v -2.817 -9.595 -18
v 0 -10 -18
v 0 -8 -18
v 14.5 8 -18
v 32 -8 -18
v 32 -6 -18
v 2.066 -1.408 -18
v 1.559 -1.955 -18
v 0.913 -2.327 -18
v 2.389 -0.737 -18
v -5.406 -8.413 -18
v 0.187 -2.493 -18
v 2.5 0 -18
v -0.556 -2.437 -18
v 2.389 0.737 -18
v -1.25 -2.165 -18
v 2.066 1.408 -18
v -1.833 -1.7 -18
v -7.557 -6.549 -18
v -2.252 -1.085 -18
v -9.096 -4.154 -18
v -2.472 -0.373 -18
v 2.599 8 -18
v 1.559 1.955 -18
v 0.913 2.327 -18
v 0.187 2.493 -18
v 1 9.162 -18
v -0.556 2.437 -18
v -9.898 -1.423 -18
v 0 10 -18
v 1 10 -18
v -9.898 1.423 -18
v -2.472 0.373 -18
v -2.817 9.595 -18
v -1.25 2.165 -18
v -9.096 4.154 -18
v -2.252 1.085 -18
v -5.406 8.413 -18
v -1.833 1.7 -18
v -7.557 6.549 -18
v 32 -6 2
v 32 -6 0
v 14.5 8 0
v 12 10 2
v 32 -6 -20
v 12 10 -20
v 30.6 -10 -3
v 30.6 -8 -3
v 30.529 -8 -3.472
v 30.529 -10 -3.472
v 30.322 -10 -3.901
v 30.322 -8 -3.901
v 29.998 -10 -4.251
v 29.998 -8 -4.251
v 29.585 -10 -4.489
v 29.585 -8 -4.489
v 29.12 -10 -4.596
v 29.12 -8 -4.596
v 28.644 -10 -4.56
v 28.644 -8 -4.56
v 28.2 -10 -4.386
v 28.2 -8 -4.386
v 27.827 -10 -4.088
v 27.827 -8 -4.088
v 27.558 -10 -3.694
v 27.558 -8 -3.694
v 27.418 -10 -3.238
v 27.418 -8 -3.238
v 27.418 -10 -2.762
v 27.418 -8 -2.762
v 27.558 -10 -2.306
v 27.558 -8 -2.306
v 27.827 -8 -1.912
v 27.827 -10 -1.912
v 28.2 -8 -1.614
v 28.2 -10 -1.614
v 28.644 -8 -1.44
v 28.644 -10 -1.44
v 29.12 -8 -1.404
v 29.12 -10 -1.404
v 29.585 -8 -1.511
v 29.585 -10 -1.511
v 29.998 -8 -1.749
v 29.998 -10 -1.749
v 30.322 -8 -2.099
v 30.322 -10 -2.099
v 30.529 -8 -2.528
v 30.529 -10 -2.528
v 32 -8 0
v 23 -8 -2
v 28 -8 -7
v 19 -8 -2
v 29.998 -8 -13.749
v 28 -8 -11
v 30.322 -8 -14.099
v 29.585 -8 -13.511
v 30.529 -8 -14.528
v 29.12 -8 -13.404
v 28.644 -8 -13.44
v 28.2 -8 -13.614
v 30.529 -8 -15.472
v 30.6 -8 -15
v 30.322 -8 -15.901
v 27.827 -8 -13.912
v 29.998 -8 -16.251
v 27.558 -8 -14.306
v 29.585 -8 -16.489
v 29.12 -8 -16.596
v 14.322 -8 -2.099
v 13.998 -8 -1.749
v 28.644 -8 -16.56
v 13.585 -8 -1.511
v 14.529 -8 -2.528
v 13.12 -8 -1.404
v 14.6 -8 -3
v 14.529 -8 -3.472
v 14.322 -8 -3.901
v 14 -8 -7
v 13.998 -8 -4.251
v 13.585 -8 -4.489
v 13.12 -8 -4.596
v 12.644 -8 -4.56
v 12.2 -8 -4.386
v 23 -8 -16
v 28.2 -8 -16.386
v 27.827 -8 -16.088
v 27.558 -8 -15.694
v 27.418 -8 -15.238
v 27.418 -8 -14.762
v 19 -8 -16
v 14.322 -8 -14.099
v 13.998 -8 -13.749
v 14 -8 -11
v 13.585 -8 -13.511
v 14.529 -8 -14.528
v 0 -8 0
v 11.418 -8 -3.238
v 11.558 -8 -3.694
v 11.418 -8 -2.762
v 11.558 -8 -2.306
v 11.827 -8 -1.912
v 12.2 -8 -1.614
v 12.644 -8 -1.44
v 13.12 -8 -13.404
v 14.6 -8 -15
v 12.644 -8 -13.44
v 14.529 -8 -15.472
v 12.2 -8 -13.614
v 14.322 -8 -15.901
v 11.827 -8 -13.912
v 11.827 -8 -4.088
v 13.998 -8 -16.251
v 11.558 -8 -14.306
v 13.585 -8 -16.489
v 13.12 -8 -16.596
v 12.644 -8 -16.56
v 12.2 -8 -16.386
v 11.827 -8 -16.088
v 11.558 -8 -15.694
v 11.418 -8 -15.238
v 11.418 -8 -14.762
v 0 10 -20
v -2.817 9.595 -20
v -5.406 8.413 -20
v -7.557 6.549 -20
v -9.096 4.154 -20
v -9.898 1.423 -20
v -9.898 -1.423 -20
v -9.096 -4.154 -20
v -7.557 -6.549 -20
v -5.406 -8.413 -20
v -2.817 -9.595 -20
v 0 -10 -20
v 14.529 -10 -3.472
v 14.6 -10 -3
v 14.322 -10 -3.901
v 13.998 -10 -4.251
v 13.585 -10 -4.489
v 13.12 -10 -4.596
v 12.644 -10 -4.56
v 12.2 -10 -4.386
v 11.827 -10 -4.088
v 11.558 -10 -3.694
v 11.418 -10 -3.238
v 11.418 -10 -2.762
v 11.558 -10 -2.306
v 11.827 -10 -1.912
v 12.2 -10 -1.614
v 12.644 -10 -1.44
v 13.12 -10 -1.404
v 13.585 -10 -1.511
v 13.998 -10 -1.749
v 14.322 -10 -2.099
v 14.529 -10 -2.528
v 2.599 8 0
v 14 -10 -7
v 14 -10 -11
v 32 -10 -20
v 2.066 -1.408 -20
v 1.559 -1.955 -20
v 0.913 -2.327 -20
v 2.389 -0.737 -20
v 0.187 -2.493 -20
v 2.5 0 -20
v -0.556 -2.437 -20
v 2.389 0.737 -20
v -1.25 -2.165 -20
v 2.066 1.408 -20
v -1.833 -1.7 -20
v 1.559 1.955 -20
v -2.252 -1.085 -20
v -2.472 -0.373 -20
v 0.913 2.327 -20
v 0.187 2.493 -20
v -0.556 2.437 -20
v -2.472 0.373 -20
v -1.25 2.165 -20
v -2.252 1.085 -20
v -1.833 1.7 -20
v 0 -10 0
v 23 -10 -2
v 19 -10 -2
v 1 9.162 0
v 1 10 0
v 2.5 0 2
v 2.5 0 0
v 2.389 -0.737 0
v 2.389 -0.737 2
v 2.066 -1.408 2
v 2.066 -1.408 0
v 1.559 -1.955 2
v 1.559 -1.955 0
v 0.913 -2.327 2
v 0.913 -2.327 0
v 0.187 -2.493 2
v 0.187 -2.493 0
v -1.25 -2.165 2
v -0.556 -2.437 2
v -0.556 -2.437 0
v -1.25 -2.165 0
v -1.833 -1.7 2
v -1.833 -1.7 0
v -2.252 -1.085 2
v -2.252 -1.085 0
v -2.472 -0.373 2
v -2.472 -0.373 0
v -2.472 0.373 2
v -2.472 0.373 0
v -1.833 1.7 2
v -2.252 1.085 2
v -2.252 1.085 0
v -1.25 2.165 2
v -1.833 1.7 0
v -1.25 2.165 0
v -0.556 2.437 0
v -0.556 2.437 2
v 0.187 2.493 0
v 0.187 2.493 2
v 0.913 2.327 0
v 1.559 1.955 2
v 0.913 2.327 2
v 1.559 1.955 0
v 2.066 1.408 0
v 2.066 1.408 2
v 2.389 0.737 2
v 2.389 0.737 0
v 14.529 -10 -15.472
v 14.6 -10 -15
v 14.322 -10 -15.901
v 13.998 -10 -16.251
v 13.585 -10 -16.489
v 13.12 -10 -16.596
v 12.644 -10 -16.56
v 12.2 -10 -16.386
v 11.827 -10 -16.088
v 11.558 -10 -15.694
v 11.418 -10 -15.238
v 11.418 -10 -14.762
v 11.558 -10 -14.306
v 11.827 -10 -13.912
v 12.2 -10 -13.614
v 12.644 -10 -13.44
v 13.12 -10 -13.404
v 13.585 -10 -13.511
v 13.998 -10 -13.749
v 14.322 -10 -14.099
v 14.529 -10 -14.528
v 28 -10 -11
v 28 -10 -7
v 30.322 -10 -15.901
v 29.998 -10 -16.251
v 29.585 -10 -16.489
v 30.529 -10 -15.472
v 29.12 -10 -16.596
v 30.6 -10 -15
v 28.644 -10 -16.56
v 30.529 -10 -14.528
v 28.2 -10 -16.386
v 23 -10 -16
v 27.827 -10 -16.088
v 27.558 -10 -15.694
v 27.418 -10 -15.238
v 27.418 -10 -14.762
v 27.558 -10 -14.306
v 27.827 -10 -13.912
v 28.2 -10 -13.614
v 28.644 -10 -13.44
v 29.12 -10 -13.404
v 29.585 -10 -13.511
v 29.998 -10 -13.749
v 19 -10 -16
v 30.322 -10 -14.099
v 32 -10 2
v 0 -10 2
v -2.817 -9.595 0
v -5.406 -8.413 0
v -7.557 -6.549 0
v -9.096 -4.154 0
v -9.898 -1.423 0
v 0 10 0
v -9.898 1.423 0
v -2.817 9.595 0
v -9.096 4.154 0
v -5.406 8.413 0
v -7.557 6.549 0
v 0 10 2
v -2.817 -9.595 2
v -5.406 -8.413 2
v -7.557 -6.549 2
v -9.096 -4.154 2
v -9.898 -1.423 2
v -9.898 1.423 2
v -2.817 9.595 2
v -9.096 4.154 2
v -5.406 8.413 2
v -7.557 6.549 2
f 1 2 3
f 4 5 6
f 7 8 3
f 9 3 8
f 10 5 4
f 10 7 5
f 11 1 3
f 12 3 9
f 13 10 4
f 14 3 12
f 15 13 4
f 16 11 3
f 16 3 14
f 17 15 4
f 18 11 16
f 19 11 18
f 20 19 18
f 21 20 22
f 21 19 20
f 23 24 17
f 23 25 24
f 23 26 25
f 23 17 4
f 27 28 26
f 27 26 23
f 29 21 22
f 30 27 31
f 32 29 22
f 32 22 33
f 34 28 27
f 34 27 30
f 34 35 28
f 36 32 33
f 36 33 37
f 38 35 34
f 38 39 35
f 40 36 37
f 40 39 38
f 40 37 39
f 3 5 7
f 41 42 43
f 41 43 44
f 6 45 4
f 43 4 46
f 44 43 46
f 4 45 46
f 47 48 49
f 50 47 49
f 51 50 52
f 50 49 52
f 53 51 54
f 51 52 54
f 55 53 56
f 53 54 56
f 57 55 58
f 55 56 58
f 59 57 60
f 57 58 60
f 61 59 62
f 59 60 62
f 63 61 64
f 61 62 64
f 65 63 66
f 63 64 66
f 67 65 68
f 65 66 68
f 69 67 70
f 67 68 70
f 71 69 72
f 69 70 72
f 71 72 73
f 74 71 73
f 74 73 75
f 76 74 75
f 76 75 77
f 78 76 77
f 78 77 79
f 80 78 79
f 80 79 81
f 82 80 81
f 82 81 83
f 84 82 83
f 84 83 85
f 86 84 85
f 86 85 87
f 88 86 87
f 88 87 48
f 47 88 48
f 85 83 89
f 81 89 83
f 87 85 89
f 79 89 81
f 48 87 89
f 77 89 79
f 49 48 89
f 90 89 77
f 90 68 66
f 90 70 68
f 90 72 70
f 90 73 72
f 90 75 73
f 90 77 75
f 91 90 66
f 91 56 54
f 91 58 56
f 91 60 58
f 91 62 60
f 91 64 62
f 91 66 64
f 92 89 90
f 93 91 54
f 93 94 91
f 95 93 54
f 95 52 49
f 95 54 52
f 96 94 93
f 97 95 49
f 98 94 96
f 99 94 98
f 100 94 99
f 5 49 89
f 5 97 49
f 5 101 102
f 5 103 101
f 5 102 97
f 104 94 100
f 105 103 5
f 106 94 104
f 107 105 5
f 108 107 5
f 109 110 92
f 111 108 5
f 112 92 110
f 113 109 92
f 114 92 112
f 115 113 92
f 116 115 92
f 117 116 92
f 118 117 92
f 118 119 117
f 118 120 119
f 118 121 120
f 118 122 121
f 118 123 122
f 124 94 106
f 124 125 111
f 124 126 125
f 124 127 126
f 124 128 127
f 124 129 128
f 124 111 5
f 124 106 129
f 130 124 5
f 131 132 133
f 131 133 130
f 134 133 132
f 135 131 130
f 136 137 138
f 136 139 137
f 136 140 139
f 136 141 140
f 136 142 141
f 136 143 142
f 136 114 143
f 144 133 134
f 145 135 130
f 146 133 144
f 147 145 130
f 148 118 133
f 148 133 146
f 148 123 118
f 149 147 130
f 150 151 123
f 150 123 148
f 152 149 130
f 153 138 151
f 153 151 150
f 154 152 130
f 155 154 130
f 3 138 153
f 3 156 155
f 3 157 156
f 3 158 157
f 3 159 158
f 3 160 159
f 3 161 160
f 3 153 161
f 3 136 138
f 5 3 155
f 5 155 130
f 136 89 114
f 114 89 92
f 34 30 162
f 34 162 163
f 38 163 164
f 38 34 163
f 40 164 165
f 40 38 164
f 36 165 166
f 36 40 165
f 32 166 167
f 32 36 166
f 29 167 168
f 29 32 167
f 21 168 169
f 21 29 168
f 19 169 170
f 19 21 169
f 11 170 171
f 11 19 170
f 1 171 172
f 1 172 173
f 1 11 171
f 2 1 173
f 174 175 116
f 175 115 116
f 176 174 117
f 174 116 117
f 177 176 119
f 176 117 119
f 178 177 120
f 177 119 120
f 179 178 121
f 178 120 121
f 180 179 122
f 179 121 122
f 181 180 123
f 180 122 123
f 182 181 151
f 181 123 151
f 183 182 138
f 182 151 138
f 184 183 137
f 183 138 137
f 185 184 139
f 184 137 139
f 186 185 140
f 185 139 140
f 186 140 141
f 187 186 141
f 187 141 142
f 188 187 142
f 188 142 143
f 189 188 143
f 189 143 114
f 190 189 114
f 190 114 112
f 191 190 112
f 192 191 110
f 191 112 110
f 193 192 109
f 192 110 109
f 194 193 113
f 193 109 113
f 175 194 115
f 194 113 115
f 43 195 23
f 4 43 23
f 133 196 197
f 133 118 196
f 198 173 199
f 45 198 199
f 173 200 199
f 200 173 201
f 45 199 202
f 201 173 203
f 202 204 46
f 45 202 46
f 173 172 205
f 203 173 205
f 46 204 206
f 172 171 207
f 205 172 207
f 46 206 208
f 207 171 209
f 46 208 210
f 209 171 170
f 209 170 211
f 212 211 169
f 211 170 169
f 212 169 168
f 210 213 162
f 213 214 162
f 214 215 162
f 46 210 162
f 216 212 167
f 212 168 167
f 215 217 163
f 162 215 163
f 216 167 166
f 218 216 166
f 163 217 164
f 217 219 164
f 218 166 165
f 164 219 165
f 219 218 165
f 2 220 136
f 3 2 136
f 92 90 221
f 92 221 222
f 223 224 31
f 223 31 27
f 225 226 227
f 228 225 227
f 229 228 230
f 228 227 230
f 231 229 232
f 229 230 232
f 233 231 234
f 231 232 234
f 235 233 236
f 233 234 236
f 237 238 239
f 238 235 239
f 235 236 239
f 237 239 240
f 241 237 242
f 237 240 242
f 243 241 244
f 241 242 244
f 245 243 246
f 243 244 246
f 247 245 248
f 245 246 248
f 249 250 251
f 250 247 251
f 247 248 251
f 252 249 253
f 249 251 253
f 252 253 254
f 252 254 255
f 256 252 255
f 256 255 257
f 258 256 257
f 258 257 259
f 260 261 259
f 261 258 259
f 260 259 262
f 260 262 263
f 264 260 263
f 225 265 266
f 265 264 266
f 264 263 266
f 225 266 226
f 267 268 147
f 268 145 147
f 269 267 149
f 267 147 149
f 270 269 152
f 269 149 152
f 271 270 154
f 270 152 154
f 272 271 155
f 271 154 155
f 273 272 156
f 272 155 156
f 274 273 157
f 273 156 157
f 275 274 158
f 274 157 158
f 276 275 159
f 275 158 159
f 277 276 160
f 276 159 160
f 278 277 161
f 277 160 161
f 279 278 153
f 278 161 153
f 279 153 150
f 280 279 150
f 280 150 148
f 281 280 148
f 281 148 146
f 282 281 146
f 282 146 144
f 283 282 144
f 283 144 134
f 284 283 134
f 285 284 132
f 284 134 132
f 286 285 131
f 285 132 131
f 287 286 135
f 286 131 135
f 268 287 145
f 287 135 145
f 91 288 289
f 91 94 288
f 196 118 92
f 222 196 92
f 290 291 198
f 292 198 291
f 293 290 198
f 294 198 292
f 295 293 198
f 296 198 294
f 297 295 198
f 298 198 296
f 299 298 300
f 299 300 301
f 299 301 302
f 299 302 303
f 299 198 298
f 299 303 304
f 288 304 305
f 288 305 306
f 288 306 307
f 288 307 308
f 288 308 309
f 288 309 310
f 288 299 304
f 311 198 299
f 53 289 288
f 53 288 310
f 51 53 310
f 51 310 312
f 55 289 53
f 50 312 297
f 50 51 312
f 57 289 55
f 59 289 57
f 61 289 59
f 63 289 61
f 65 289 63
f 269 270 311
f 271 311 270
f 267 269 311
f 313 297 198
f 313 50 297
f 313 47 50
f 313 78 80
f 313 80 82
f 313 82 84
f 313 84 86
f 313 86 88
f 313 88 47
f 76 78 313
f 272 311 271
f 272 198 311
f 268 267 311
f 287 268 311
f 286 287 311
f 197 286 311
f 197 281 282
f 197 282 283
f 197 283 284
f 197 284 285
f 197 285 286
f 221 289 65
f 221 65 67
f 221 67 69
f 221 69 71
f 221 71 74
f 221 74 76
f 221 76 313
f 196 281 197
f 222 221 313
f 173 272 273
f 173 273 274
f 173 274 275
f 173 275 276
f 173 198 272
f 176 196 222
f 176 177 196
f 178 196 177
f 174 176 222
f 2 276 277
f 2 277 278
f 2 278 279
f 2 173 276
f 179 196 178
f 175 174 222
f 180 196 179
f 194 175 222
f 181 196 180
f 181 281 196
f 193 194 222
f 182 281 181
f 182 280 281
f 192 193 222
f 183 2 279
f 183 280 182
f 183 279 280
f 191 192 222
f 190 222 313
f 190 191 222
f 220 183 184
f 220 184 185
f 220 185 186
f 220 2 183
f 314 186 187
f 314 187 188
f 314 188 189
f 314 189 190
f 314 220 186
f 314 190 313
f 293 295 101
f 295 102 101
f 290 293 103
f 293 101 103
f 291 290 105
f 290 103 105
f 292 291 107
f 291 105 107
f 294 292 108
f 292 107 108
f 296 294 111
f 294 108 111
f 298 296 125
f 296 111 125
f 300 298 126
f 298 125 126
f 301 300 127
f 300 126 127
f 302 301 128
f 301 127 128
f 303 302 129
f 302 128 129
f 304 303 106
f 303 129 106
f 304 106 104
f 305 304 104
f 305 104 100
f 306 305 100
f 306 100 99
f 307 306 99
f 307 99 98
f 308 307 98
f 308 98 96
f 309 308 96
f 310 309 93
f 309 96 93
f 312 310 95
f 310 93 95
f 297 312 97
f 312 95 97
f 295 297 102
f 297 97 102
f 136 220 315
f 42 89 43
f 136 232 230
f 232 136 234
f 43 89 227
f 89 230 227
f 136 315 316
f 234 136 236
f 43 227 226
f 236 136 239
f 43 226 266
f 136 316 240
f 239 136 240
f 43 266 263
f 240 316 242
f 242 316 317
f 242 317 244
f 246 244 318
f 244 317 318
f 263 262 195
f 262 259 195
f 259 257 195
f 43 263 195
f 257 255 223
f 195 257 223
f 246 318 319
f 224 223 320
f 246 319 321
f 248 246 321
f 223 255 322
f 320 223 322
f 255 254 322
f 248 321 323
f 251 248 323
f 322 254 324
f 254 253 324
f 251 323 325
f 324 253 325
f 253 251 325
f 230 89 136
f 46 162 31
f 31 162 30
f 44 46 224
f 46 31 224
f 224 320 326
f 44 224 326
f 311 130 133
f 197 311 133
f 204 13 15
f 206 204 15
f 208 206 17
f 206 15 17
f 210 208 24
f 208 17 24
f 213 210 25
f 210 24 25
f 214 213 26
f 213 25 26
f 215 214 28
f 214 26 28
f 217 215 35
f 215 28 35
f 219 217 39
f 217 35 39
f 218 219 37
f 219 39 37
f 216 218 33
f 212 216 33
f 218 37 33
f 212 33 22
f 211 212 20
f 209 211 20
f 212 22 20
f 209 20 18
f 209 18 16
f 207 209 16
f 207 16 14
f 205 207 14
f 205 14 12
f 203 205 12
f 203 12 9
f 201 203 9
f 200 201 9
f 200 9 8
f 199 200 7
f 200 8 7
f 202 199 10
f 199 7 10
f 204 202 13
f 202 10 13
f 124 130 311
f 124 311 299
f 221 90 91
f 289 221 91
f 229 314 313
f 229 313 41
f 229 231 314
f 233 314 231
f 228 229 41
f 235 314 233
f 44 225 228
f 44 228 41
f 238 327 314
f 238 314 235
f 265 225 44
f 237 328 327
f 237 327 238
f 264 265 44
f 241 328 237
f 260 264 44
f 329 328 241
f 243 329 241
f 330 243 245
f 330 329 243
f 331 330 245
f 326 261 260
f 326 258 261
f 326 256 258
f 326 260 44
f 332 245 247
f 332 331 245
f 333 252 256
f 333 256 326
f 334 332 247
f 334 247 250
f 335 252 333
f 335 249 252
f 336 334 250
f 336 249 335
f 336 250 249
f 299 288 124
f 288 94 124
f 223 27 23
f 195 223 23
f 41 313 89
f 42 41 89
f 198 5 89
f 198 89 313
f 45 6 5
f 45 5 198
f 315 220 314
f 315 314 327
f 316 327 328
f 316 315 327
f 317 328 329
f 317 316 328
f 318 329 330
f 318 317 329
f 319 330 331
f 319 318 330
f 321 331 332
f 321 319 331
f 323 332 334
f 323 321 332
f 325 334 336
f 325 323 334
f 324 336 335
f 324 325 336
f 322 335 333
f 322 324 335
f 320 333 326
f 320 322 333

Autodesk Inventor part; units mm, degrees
ref_plane "YZ Plane" through (0, 0, 0) normal (1, 0, 0) x (0, 1, 0)
ref_plane "XZ Plane" through (0, 0, 0) normal (0, 1, 0) x (-1, 0, 0)
sketch "Sketch1" plane through (0, 0, 0) normal (0, 0, 1) x (1, 0, 0)
  circle A0 centre (0, 0) radius 2.5
  arc A1 (0, 10) -> (0, -10) centre (0, 0) ccw
  line L0 (0, 10) -> (12, 10)
  line L1 (0, -10) -> (12, -10)
  line L2 (12, -10) -> (12, 10)
  dimension "d0" = 5
  dimension "d1" = 20
  dimension "d2" = 12
extrude "Extrusion1" add sketch "Sketch1" along normal blind 2
sketch "Sketch5" plane through (0, 0, 0) normal (0, 0, -1) x (-1, 0, 0)
  circle A0 centre (0, 0) radius 2.5 projected
  line L0 (-12, -10) -> (0, -10)
  line L1 (0, -10) -> (0, -8)
  line L2 (0, -8) -> (-12, -8)
  line L3 (-12, -8) -> (-12, -10)
  line L4 (-12, 10) -> (-1, 10)
  line L5 (-1, 10) -> (-1, 8)
  line L6 (-1, 8) -> (-12, 8)
  line L7 (-12, 8) -> (-12, 10)
  dimension "d21" = 2
  dimension "d22" = 2
  dimension "d24" = 1
extrude "Extrusion5" add sketch "Sketch5" along normal blind 2 contours L3 L2 L1 L0 | L4 L5 L6 L7
sketch "Sketch6" plane through (0, 0, -2) normal (0, 0, -1) x (-1, 0, 0)
  line L0 (-12, 8) -> (-1, 8) projected
  line L1 (-1, 8) -> (-1, 10) projected
  line L2 (-1, 9.162) -> (-2.5994, 8)
  line L3 (-2.5994, 8) -> (6.8052, -4.9443) construction
  line L4 (6.8052, -4.9443) -> (8.4046, -3.7823) construction
  line L5 (8.4046, -3.7823) -> (-1, 9.162) construction
  line L6 (-2.5994, 8) -> (-1, 8)
  line L7 (-1, 9.162) -> (-1, 8)
  point P0 (0, 0)
  dimension "d27" = 16
  dimension "d28" = 8
  dimension "d29" = 36
extrude "Extrusion6" cut sketch "Sketch6" against normal blind 2
ref_plane "Work Plane1" through (0, 0, -9) normal (0, 0, -1) x (-1, 0, 0)
mirror "Mirror1" about plane through (0, 0, -9) normal (0, 0, -1)
sketch "Sketch7" plane through (0, -10, -16) normal (0, 0, 1) x (1, 0, 0)
  line L0 (12, 0) -> (0, 0) projected
  line L1 (12, 2) -> (12, 0) projected
  line L2 (0, 2) -> (12, 2) projected
  line L3 (0, 0) -> (0, 2) projected
  line L4 (2.5994, 18) -> (1, 19.162) projected
  line L5 (12, 18) -> (2.5994, 18) projected
  line L6 (12, 20) -> (12, 18) projected
  line L7 (1, 20) -> (12, 20) projected
  line L8 (1, 19.162) -> (1, 20) projected
  point P0 (0, 10)
extrude "Extrusion7" add sketch "Sketch7" along normal blind 14
sketch "Sketch8" plane through (12, -10, 2) normal (1, 0, 0) x (0, 0, -1)
  line L0 (22, 20) -> (0, 20) projected
  line L1 (0, 0) -> (0, 20) projected
  line L2 (22, 0) -> (0, 0) projected
  line L3 (22, 0) -> (22, 20) projected
  line L4 (2, 18) -> (20, 18) projected
  line L5 (20, 2) -> (20, 18) projected
  line L6 (2, 2) -> (20, 2) projected
  line L7 (2, 2) -> (2, 18) projected
  point P0 (2, 10)
extrude "Extrusion8" add sketch "Sketch8" along normal blind 20
sketch "Sketch9" plane through (0, 0, -20) normal (0, 0, -1) x (-1, 0, 0)
  line L0 (-32, 10) -> (0, 10) projected
  line L1 (-32, -10) -> (-32, 10) projected
  line L2 (-32, -6) -> (-12, 10)
  dimension "d37" = 20
  dimension "d38" = 4
extrude "Extrusion9" cut sketch "Sketch9" against normal blind 22
sketch "Sketch10" plane through (0, -8, 0) normal (0, 1, 0) x (1, 0, 0)
  line L0 (32, 0) -> (0, 0) projected
  line L1 (32, 18) -> (32, 0) projected
  line L2 (0, 18) -> (32, 18) projected
  line L3 (13, 15) -> (29, 15) construction
  line L4 (29, 15) -> (29, 3) construction
  line L5 (29, 3) -> (13, 3) construction
  line L6 (13, 3) -> (13, 15) construction
  circle A0 centre (13, 15) radius 1.6
  circle A1 centre (29, 15) radius 1.6
  circle A2 centre (29, 3) radius 1.6
  circle A3 centre (13, 3) radius 1.6
  line L7 (19, 16) -> (23, 16)
  line L8 (28, 11) -> (28, 7)
  line L9 (23, 2) -> (19, 2)
  line L10 (14, 7) -> (14, 11)
  line L11 (14, 7) -> (19, 2)
  line L12 (23, 2) -> (28, 7)
  line L13 (28, 11) -> (23, 16)
  line L14 (19, 16) -> (14, 11)
  point P0 (14, 9)
  point P1 (13, 9)
  dimension "d41" = 3.2
  dimension "d42" = 3
  dimension "d43" = 3
  dimension "d44" = 3
  dimension "d45" = 16
  dimension "d46" = 45
  dimension "d47" = 4
  dimension "d48" = 1
  dimension "d49" = 1
extrude "Extrusion10" cut sketch "Sketch10" against normal through all
properties part number "z_axis_cable_mount_a" material "ABS Plastic"
